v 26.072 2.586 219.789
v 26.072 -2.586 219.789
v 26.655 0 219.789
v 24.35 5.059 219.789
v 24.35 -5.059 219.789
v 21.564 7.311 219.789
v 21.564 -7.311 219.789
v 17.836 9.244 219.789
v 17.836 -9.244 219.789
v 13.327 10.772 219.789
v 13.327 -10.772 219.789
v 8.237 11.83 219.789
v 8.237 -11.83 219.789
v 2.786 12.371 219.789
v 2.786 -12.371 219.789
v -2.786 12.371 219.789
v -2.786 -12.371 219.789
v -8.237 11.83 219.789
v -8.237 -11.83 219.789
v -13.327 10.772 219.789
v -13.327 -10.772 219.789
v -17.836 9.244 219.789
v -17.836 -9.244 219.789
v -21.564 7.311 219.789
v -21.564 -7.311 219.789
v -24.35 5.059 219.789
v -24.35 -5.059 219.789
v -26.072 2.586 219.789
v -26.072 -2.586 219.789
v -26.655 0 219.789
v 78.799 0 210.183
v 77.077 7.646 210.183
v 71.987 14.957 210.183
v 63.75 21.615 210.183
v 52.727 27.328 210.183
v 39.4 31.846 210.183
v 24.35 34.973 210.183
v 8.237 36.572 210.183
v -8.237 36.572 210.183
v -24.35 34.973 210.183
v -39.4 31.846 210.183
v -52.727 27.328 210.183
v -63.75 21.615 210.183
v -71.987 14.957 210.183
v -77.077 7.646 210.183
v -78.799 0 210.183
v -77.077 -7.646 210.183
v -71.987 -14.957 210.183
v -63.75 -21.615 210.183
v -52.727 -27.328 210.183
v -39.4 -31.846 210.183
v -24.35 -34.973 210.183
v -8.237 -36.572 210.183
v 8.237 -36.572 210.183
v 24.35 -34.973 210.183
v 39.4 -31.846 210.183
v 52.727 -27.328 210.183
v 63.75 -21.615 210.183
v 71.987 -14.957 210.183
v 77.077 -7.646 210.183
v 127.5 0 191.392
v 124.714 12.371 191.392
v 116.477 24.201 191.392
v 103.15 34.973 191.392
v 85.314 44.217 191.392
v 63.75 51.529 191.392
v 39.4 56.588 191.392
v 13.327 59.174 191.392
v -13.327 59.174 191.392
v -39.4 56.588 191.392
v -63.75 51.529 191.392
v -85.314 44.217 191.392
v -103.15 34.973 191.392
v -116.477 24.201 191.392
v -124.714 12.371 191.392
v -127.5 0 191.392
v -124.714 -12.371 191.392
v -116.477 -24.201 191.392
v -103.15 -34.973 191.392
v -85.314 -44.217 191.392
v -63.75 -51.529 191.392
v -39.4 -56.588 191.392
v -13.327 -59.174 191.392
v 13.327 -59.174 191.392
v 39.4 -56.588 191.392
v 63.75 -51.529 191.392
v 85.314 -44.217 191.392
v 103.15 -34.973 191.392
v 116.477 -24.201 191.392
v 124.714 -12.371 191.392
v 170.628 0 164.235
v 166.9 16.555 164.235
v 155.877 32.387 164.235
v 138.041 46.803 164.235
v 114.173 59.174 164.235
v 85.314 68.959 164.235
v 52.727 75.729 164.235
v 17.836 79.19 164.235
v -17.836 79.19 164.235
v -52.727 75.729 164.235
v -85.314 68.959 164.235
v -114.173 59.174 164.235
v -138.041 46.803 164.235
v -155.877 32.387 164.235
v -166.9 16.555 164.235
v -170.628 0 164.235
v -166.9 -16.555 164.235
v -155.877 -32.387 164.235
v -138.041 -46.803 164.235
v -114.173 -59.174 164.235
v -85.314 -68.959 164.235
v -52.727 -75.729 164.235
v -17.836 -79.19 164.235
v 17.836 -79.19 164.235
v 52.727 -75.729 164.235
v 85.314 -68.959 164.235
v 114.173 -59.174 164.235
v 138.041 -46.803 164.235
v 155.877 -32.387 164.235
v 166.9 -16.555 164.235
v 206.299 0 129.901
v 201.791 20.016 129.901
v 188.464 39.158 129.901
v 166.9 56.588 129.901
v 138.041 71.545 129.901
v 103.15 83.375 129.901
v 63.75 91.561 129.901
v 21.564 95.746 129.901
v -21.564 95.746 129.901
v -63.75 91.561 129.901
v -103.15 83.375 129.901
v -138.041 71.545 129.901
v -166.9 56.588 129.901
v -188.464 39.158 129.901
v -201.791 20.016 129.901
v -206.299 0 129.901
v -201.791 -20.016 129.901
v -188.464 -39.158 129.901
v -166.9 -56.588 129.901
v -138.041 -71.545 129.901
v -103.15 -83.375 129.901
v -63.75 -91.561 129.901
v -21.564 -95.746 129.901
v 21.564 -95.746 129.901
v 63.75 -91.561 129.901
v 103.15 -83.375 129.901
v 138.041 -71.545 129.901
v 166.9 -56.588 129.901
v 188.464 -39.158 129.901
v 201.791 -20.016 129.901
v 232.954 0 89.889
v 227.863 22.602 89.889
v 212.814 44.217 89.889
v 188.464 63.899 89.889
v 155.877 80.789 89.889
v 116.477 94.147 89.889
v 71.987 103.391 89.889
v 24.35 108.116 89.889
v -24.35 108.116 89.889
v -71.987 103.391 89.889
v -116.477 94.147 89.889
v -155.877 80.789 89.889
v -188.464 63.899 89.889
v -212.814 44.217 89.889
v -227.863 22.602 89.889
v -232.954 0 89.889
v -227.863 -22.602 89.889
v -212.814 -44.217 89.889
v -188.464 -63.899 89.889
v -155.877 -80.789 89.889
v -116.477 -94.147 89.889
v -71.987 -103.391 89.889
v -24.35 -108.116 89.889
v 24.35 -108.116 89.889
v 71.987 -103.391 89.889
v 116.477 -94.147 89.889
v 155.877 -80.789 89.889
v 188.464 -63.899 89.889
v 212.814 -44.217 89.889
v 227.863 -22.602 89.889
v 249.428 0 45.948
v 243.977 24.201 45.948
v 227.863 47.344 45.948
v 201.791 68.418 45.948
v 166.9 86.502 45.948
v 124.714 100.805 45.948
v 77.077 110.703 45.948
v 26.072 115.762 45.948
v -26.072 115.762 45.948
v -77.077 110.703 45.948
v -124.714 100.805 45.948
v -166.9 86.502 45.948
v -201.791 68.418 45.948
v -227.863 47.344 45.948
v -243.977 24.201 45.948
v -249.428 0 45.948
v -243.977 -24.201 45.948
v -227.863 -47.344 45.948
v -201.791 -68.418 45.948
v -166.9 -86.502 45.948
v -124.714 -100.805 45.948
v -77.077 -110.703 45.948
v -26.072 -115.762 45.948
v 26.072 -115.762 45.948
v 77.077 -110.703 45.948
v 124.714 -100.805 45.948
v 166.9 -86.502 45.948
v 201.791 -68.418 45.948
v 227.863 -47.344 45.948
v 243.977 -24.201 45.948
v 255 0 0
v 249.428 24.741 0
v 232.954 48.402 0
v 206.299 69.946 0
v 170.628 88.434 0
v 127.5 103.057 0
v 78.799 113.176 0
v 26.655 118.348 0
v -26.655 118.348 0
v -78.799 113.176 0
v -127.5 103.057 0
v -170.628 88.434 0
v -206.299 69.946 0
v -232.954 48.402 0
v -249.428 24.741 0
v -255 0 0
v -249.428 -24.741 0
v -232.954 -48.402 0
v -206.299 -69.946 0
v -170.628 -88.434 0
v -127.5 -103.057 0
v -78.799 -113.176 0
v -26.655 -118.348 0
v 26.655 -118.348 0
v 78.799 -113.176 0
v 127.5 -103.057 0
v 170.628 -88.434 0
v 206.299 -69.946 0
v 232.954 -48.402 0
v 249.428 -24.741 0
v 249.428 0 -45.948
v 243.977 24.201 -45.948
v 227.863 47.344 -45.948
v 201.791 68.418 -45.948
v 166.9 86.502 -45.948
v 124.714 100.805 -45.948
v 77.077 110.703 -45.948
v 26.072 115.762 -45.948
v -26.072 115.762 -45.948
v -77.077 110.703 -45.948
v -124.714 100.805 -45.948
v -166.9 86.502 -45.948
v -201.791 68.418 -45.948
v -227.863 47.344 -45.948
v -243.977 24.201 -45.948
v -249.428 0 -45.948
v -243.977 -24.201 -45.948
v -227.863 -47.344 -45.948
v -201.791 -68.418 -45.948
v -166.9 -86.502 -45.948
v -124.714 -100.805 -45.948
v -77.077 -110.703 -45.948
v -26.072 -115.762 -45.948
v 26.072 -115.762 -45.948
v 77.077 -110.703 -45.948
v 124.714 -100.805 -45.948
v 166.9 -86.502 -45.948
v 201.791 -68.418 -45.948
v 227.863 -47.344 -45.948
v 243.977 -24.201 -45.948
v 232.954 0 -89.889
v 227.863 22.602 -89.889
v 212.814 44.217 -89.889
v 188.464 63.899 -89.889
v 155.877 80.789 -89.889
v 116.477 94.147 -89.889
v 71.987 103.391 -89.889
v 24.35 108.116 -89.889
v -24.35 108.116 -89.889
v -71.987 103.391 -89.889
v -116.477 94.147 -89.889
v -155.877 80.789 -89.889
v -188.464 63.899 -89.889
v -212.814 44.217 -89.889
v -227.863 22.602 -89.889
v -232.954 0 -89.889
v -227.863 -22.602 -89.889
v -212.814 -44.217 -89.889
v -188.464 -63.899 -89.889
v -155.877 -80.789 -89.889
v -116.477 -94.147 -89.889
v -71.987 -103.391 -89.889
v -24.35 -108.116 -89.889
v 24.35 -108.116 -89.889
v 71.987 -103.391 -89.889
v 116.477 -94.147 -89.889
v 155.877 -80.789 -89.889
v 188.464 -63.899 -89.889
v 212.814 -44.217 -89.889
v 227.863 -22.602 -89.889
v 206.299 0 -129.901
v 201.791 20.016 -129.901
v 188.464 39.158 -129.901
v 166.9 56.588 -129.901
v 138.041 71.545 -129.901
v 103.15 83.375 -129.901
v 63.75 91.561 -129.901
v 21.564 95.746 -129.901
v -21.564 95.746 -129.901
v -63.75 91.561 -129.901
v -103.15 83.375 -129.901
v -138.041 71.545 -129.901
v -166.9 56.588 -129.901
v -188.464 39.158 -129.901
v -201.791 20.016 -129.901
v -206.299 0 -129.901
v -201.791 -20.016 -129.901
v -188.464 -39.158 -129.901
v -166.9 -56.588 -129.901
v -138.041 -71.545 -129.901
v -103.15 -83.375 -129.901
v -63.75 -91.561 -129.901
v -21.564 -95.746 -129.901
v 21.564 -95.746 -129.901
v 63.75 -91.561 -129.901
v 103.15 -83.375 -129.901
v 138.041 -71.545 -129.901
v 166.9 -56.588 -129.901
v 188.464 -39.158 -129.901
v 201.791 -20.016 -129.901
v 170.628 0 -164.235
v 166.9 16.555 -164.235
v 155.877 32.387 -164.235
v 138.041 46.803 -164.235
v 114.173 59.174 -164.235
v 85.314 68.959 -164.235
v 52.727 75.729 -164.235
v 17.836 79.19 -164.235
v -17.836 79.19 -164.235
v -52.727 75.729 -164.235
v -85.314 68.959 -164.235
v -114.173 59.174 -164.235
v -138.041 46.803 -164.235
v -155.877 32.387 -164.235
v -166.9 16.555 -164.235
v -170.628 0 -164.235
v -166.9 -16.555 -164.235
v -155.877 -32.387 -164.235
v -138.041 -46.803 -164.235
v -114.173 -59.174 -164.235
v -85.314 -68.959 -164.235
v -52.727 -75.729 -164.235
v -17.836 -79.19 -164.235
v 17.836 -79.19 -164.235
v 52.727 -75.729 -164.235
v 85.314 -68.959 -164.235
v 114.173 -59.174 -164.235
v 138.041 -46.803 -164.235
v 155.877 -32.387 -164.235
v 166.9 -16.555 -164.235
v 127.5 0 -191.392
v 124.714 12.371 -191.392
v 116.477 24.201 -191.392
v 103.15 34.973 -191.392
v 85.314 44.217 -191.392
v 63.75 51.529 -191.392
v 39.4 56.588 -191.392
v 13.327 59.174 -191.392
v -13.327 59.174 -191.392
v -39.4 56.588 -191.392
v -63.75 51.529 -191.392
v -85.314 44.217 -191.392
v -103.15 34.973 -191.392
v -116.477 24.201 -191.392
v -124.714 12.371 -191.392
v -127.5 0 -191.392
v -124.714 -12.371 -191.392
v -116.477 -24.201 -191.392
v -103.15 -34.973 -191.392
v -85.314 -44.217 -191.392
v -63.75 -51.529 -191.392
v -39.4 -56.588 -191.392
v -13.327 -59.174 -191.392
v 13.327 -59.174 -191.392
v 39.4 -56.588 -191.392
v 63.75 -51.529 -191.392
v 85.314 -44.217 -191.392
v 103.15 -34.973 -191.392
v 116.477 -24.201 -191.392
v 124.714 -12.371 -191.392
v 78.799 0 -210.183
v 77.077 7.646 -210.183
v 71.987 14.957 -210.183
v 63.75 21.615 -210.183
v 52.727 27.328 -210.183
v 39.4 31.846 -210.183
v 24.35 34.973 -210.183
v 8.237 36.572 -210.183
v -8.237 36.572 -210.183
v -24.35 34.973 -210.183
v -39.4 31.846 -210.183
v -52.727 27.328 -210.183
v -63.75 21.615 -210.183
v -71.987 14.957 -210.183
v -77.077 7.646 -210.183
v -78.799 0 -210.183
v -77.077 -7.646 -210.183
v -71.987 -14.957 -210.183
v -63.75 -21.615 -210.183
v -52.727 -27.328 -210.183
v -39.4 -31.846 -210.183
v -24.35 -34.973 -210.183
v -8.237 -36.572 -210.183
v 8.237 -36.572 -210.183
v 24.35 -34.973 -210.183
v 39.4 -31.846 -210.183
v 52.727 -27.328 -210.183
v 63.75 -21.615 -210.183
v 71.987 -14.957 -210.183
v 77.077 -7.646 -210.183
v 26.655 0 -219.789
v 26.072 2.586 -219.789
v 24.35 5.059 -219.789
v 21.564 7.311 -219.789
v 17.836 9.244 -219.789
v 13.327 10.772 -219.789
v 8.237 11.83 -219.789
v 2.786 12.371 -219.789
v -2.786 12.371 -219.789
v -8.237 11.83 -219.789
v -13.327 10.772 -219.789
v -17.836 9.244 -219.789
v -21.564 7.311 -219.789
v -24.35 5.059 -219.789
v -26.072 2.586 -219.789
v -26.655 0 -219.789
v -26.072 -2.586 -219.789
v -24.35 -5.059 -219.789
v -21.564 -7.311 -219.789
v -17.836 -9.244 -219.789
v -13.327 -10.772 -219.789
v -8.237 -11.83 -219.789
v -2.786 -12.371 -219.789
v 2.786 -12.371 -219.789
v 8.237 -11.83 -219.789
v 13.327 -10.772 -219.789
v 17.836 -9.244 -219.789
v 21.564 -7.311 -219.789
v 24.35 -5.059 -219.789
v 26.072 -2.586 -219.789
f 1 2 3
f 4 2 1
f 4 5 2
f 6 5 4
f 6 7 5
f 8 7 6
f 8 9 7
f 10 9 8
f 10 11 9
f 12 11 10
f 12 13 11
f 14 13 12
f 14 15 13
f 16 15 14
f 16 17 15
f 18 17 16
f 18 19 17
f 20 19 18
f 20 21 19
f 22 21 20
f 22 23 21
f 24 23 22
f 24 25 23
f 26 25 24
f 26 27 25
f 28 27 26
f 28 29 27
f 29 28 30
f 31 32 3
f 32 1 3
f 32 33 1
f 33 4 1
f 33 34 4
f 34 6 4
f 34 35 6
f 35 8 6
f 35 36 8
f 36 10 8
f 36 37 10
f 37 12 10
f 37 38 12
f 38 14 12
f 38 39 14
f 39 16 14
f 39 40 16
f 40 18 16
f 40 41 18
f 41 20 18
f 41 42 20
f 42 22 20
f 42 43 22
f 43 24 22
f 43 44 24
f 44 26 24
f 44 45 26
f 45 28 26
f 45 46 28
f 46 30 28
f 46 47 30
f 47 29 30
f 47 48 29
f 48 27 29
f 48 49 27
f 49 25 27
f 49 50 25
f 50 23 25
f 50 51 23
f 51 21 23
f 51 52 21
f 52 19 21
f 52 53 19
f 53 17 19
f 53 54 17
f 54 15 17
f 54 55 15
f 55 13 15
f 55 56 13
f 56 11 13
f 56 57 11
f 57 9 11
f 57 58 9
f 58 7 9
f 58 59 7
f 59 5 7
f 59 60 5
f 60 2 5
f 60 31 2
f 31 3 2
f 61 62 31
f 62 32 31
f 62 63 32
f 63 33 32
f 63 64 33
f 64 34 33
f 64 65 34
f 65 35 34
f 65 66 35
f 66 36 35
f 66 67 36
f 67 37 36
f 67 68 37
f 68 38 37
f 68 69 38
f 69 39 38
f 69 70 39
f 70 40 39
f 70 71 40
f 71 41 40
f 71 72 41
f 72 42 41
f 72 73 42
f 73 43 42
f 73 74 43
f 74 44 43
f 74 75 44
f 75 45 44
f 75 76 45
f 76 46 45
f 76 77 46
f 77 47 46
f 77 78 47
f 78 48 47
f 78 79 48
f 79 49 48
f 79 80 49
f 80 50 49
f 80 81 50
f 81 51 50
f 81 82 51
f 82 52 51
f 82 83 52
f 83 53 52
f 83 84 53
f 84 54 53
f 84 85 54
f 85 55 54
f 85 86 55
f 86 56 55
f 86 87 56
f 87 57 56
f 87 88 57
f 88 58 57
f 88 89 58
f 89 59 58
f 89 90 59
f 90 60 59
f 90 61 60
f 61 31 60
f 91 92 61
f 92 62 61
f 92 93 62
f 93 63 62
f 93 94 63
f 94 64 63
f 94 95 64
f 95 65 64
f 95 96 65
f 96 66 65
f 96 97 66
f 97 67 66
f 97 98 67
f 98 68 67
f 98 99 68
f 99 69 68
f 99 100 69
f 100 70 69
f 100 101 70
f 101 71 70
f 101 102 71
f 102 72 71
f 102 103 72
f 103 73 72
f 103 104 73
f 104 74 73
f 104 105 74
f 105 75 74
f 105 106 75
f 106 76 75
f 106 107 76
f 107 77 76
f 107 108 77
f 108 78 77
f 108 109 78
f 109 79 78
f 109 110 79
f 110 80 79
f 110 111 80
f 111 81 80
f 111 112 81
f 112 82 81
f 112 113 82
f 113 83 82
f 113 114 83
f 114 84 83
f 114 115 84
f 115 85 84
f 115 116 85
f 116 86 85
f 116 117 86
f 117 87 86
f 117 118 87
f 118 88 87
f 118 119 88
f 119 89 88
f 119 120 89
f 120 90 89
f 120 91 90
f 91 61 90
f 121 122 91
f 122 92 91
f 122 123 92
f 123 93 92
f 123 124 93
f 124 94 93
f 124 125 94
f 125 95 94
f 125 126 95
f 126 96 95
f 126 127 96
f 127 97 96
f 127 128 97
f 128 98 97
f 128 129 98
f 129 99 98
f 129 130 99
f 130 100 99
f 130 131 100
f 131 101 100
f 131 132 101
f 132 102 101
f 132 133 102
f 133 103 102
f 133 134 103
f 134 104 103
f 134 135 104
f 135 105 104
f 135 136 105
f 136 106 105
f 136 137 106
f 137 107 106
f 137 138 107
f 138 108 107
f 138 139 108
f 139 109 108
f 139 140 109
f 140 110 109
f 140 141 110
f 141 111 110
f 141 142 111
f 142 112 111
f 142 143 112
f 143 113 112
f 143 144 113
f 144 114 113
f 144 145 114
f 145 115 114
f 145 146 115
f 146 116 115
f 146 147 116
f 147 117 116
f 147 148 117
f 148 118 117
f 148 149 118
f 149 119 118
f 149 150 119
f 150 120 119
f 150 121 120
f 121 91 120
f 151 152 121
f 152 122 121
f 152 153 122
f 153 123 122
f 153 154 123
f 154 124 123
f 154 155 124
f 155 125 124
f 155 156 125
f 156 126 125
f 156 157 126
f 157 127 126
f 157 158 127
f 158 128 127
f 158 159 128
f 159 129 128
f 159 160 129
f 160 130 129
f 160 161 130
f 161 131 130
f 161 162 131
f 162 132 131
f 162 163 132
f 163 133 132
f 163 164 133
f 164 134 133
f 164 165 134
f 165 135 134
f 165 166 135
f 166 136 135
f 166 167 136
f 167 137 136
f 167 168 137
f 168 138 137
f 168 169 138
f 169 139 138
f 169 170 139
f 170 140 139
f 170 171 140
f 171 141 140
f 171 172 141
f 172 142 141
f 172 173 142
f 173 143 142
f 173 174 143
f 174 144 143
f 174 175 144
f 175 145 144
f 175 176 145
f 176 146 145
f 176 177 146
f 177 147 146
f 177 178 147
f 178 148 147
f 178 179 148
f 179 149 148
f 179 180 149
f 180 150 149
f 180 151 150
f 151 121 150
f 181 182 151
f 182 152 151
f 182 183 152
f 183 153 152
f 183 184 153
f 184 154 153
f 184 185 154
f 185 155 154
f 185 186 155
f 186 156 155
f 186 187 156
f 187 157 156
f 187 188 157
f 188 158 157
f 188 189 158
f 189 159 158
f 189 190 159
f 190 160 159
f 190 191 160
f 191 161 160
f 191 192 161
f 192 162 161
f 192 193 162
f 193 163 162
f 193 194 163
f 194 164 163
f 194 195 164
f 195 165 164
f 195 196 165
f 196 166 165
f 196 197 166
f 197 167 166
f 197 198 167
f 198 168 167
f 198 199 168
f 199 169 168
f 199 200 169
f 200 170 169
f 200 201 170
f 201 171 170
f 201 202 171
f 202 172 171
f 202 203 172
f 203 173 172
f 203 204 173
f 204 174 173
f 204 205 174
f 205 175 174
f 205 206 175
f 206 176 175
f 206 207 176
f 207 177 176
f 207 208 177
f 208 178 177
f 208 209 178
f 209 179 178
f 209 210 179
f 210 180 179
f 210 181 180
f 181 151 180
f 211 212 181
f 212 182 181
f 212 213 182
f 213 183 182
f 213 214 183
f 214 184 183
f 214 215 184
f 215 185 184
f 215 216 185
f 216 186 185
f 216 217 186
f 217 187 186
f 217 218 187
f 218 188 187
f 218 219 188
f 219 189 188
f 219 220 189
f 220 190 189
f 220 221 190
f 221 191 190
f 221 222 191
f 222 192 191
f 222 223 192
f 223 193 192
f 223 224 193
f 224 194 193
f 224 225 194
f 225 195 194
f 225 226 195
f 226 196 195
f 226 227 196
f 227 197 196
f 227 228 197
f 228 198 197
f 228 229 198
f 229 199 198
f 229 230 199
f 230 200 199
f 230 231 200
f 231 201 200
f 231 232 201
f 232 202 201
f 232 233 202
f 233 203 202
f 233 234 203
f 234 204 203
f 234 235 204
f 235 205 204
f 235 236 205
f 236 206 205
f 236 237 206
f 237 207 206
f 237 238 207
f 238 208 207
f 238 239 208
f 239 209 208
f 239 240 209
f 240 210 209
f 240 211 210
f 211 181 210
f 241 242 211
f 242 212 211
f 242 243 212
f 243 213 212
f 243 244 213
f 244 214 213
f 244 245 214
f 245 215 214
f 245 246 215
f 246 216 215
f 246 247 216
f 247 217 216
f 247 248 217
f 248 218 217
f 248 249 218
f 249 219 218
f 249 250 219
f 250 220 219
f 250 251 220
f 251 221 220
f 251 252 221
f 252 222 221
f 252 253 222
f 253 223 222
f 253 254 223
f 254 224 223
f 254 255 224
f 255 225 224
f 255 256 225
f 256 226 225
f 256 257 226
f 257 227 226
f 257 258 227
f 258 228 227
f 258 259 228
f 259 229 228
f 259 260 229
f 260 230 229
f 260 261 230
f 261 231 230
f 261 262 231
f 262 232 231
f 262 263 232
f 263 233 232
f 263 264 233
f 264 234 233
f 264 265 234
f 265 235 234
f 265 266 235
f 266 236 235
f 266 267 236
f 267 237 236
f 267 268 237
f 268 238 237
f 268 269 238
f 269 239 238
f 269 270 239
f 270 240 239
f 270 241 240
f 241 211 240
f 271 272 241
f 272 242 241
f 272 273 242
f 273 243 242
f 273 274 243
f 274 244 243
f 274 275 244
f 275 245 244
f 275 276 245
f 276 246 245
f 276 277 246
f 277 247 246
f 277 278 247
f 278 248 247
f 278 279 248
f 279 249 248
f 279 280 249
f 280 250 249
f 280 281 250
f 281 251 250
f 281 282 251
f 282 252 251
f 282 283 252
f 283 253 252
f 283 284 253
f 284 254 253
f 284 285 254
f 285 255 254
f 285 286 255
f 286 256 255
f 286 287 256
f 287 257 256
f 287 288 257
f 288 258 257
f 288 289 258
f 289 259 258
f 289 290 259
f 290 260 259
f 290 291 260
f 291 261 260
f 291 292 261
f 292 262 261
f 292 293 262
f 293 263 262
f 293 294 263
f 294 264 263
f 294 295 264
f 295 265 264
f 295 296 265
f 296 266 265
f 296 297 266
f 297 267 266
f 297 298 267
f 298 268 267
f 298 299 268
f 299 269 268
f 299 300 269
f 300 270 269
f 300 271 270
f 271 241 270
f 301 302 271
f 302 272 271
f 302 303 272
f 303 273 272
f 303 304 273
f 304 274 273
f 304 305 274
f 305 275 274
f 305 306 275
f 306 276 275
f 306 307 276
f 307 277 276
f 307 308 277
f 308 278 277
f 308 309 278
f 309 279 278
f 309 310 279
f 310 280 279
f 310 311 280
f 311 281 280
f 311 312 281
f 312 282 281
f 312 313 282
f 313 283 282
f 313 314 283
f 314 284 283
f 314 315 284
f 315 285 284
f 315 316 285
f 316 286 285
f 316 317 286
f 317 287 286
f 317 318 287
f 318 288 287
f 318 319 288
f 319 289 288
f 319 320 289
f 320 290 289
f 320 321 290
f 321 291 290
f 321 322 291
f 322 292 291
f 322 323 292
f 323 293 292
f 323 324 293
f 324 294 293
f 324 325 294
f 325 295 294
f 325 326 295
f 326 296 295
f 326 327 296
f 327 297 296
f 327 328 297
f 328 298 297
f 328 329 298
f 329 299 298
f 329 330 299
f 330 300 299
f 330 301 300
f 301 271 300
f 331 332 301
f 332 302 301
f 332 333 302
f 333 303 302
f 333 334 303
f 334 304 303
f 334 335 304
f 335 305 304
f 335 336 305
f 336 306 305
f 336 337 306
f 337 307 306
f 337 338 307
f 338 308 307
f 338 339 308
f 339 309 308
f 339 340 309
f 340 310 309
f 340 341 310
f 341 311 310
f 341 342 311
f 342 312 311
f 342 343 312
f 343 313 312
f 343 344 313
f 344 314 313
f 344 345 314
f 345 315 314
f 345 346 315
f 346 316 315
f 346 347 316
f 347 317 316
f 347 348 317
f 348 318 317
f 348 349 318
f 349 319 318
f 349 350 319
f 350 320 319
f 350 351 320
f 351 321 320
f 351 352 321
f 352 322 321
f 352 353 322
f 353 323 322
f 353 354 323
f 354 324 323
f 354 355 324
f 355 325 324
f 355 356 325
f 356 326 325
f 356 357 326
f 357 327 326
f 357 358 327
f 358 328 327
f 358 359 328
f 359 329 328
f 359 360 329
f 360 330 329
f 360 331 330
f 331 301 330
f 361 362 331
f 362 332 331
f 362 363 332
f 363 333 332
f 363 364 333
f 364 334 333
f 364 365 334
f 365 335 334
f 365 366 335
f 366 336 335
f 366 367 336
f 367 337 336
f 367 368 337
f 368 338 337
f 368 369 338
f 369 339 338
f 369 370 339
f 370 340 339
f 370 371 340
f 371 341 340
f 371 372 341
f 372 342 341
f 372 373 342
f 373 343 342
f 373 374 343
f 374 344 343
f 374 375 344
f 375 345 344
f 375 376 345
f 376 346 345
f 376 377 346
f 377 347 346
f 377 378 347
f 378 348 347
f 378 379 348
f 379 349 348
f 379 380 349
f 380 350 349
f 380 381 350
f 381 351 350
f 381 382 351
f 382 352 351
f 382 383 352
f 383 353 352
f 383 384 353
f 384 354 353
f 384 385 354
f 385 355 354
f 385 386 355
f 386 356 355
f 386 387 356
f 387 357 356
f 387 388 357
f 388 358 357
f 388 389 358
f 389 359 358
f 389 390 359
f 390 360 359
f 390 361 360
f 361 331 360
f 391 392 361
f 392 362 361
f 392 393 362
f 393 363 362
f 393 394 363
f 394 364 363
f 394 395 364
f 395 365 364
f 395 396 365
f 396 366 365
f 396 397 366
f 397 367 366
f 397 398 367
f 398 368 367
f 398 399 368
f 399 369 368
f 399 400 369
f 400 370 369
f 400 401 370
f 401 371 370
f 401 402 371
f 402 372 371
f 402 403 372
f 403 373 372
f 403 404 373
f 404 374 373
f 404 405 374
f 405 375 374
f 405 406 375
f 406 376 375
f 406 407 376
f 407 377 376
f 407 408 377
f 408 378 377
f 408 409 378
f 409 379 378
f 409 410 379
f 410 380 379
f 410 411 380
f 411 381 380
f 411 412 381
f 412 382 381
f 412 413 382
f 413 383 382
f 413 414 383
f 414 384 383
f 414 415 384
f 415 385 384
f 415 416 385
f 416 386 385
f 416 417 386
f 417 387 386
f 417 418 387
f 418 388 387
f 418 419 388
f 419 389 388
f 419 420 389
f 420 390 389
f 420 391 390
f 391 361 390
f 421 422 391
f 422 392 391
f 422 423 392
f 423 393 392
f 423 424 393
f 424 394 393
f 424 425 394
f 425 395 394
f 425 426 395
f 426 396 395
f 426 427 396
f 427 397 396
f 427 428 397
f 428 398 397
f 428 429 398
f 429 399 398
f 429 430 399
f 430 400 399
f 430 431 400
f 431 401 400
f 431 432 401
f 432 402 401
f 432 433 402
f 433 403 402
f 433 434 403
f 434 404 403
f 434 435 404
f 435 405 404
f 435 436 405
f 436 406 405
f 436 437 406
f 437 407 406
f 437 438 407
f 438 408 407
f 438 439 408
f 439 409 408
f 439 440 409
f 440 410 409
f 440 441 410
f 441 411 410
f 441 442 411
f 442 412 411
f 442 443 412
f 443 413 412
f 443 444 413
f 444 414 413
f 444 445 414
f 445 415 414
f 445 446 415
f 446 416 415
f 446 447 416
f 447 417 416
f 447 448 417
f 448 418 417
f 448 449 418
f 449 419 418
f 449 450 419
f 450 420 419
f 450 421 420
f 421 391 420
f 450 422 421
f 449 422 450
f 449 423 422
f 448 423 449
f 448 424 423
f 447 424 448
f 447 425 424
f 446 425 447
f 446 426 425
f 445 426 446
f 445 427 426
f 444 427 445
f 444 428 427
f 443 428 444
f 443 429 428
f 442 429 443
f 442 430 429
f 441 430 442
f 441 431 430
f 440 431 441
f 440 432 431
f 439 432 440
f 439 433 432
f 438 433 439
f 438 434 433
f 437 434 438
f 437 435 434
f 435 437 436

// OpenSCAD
// Generated by SolidPython 1.0.1 on 2020-07-29 00:46:51


scale(v = [15, 7, 13]) {
	sphere(r = 17);
}
/***********************************************
*********      SolidPython code:      **********
************************************************
 
# import packages: SolidPython
from solid import *
from solid.utils import *
from itertools import chain, combinations, permutations


class Resize:

    def __init__(self, scad_file):
        self.scad_file = scad_file
        #self.scad_file = import_scad(scad_file)
        # cone/cylinder param:
        self.r1 = 0
        self.r2 = 0
        self.h = 0
        # rectangular prism param:
        self.w = 0
        self.l = 0
        # ellipse param:
        self.r = 0

    # import OpenScad code (file name corresponds to shape)


    # classify shape + parameters
    def assign(self, param1, param2, param3):
        if self.scad_file == 'cone.scad':
            self.r1 = param1
            self.r2 = param2
            self.h = param3
        elif self.scad_file == 'cylinder.scad':
            self.r1 = param1
            self.r2 = param2
            self.h = param3
        elif self.scad_file == 'rectangularPrism.scad':
            self.h = param1
            self.l = param2
            self.w = param3
        else:
            self.r = param1
            self.h = param2

    # resize parameters
    def iterate(self):
        x = range(3, 20, 2)
        i = 1
        if self.scad_file == 'cone.scad':
            tempList = list(permutations(x, 2))
            for temp in tempList:
                param1 = temp[0]
                param2 = temp[1]
                filepath = 'produced_scad_files/' + 'cone' + str(param1) + '_' + str(param2) + '_' + '.scad'
                scad_render_to_file(cylinder(h=param1, r1=param2, r2=0), filepath)

        elif self.scad_file == 'cylinder.scad':
            tempList = list(permutations(x, 3))
            for temp in tempList:
                param1 = temp[0]
                param2 = temp[1]
                filepath = 'produced_scad_files/' + 'cylinder' + str(param1) + '_' + str(param2) + '_' + '.scad'
                scad_render_to_file(cylinder(h=param1, r1=param2, r2=param2), filepath)

        elif self.scad_file == 'rectangularPrism.scad':
            tempList = list(permutations(x, 3))
            for temp in tempList:
                param1 = temp[0]
                param2 = temp[1]
                param3 = temp[2]
                filepath = 'produced_scad_files/' + 'rectangularPrism' + str(param1) + '_' + str(param2) + '_' + str(
                    param3) + '.scad'
                scad_render_to_file(cube(size=(param1, param2, param3)), filepath)

        elif self.scad_file == 'ellipse.scad':
            tempList = list(permutations(x, 4))
            for temp in tempList:
                param1 = temp[0]
                param2 = temp[1]
                param3 = temp[2]
                param4 = temp[3]
                filepath = 'produced_scad_files/' + 'ellipse' + str(param1) + '_' + str(param2) + '_' + str(param3) + '_' + str(param4) + '.scad'
                scad_render_to_file(scale([param1, param2, param3])(sphere(r=param4)), filepath)

    def render_to_scadfile(self):
        scad_render_to_file(scad, 'example.scad') 
 
************************************************/
